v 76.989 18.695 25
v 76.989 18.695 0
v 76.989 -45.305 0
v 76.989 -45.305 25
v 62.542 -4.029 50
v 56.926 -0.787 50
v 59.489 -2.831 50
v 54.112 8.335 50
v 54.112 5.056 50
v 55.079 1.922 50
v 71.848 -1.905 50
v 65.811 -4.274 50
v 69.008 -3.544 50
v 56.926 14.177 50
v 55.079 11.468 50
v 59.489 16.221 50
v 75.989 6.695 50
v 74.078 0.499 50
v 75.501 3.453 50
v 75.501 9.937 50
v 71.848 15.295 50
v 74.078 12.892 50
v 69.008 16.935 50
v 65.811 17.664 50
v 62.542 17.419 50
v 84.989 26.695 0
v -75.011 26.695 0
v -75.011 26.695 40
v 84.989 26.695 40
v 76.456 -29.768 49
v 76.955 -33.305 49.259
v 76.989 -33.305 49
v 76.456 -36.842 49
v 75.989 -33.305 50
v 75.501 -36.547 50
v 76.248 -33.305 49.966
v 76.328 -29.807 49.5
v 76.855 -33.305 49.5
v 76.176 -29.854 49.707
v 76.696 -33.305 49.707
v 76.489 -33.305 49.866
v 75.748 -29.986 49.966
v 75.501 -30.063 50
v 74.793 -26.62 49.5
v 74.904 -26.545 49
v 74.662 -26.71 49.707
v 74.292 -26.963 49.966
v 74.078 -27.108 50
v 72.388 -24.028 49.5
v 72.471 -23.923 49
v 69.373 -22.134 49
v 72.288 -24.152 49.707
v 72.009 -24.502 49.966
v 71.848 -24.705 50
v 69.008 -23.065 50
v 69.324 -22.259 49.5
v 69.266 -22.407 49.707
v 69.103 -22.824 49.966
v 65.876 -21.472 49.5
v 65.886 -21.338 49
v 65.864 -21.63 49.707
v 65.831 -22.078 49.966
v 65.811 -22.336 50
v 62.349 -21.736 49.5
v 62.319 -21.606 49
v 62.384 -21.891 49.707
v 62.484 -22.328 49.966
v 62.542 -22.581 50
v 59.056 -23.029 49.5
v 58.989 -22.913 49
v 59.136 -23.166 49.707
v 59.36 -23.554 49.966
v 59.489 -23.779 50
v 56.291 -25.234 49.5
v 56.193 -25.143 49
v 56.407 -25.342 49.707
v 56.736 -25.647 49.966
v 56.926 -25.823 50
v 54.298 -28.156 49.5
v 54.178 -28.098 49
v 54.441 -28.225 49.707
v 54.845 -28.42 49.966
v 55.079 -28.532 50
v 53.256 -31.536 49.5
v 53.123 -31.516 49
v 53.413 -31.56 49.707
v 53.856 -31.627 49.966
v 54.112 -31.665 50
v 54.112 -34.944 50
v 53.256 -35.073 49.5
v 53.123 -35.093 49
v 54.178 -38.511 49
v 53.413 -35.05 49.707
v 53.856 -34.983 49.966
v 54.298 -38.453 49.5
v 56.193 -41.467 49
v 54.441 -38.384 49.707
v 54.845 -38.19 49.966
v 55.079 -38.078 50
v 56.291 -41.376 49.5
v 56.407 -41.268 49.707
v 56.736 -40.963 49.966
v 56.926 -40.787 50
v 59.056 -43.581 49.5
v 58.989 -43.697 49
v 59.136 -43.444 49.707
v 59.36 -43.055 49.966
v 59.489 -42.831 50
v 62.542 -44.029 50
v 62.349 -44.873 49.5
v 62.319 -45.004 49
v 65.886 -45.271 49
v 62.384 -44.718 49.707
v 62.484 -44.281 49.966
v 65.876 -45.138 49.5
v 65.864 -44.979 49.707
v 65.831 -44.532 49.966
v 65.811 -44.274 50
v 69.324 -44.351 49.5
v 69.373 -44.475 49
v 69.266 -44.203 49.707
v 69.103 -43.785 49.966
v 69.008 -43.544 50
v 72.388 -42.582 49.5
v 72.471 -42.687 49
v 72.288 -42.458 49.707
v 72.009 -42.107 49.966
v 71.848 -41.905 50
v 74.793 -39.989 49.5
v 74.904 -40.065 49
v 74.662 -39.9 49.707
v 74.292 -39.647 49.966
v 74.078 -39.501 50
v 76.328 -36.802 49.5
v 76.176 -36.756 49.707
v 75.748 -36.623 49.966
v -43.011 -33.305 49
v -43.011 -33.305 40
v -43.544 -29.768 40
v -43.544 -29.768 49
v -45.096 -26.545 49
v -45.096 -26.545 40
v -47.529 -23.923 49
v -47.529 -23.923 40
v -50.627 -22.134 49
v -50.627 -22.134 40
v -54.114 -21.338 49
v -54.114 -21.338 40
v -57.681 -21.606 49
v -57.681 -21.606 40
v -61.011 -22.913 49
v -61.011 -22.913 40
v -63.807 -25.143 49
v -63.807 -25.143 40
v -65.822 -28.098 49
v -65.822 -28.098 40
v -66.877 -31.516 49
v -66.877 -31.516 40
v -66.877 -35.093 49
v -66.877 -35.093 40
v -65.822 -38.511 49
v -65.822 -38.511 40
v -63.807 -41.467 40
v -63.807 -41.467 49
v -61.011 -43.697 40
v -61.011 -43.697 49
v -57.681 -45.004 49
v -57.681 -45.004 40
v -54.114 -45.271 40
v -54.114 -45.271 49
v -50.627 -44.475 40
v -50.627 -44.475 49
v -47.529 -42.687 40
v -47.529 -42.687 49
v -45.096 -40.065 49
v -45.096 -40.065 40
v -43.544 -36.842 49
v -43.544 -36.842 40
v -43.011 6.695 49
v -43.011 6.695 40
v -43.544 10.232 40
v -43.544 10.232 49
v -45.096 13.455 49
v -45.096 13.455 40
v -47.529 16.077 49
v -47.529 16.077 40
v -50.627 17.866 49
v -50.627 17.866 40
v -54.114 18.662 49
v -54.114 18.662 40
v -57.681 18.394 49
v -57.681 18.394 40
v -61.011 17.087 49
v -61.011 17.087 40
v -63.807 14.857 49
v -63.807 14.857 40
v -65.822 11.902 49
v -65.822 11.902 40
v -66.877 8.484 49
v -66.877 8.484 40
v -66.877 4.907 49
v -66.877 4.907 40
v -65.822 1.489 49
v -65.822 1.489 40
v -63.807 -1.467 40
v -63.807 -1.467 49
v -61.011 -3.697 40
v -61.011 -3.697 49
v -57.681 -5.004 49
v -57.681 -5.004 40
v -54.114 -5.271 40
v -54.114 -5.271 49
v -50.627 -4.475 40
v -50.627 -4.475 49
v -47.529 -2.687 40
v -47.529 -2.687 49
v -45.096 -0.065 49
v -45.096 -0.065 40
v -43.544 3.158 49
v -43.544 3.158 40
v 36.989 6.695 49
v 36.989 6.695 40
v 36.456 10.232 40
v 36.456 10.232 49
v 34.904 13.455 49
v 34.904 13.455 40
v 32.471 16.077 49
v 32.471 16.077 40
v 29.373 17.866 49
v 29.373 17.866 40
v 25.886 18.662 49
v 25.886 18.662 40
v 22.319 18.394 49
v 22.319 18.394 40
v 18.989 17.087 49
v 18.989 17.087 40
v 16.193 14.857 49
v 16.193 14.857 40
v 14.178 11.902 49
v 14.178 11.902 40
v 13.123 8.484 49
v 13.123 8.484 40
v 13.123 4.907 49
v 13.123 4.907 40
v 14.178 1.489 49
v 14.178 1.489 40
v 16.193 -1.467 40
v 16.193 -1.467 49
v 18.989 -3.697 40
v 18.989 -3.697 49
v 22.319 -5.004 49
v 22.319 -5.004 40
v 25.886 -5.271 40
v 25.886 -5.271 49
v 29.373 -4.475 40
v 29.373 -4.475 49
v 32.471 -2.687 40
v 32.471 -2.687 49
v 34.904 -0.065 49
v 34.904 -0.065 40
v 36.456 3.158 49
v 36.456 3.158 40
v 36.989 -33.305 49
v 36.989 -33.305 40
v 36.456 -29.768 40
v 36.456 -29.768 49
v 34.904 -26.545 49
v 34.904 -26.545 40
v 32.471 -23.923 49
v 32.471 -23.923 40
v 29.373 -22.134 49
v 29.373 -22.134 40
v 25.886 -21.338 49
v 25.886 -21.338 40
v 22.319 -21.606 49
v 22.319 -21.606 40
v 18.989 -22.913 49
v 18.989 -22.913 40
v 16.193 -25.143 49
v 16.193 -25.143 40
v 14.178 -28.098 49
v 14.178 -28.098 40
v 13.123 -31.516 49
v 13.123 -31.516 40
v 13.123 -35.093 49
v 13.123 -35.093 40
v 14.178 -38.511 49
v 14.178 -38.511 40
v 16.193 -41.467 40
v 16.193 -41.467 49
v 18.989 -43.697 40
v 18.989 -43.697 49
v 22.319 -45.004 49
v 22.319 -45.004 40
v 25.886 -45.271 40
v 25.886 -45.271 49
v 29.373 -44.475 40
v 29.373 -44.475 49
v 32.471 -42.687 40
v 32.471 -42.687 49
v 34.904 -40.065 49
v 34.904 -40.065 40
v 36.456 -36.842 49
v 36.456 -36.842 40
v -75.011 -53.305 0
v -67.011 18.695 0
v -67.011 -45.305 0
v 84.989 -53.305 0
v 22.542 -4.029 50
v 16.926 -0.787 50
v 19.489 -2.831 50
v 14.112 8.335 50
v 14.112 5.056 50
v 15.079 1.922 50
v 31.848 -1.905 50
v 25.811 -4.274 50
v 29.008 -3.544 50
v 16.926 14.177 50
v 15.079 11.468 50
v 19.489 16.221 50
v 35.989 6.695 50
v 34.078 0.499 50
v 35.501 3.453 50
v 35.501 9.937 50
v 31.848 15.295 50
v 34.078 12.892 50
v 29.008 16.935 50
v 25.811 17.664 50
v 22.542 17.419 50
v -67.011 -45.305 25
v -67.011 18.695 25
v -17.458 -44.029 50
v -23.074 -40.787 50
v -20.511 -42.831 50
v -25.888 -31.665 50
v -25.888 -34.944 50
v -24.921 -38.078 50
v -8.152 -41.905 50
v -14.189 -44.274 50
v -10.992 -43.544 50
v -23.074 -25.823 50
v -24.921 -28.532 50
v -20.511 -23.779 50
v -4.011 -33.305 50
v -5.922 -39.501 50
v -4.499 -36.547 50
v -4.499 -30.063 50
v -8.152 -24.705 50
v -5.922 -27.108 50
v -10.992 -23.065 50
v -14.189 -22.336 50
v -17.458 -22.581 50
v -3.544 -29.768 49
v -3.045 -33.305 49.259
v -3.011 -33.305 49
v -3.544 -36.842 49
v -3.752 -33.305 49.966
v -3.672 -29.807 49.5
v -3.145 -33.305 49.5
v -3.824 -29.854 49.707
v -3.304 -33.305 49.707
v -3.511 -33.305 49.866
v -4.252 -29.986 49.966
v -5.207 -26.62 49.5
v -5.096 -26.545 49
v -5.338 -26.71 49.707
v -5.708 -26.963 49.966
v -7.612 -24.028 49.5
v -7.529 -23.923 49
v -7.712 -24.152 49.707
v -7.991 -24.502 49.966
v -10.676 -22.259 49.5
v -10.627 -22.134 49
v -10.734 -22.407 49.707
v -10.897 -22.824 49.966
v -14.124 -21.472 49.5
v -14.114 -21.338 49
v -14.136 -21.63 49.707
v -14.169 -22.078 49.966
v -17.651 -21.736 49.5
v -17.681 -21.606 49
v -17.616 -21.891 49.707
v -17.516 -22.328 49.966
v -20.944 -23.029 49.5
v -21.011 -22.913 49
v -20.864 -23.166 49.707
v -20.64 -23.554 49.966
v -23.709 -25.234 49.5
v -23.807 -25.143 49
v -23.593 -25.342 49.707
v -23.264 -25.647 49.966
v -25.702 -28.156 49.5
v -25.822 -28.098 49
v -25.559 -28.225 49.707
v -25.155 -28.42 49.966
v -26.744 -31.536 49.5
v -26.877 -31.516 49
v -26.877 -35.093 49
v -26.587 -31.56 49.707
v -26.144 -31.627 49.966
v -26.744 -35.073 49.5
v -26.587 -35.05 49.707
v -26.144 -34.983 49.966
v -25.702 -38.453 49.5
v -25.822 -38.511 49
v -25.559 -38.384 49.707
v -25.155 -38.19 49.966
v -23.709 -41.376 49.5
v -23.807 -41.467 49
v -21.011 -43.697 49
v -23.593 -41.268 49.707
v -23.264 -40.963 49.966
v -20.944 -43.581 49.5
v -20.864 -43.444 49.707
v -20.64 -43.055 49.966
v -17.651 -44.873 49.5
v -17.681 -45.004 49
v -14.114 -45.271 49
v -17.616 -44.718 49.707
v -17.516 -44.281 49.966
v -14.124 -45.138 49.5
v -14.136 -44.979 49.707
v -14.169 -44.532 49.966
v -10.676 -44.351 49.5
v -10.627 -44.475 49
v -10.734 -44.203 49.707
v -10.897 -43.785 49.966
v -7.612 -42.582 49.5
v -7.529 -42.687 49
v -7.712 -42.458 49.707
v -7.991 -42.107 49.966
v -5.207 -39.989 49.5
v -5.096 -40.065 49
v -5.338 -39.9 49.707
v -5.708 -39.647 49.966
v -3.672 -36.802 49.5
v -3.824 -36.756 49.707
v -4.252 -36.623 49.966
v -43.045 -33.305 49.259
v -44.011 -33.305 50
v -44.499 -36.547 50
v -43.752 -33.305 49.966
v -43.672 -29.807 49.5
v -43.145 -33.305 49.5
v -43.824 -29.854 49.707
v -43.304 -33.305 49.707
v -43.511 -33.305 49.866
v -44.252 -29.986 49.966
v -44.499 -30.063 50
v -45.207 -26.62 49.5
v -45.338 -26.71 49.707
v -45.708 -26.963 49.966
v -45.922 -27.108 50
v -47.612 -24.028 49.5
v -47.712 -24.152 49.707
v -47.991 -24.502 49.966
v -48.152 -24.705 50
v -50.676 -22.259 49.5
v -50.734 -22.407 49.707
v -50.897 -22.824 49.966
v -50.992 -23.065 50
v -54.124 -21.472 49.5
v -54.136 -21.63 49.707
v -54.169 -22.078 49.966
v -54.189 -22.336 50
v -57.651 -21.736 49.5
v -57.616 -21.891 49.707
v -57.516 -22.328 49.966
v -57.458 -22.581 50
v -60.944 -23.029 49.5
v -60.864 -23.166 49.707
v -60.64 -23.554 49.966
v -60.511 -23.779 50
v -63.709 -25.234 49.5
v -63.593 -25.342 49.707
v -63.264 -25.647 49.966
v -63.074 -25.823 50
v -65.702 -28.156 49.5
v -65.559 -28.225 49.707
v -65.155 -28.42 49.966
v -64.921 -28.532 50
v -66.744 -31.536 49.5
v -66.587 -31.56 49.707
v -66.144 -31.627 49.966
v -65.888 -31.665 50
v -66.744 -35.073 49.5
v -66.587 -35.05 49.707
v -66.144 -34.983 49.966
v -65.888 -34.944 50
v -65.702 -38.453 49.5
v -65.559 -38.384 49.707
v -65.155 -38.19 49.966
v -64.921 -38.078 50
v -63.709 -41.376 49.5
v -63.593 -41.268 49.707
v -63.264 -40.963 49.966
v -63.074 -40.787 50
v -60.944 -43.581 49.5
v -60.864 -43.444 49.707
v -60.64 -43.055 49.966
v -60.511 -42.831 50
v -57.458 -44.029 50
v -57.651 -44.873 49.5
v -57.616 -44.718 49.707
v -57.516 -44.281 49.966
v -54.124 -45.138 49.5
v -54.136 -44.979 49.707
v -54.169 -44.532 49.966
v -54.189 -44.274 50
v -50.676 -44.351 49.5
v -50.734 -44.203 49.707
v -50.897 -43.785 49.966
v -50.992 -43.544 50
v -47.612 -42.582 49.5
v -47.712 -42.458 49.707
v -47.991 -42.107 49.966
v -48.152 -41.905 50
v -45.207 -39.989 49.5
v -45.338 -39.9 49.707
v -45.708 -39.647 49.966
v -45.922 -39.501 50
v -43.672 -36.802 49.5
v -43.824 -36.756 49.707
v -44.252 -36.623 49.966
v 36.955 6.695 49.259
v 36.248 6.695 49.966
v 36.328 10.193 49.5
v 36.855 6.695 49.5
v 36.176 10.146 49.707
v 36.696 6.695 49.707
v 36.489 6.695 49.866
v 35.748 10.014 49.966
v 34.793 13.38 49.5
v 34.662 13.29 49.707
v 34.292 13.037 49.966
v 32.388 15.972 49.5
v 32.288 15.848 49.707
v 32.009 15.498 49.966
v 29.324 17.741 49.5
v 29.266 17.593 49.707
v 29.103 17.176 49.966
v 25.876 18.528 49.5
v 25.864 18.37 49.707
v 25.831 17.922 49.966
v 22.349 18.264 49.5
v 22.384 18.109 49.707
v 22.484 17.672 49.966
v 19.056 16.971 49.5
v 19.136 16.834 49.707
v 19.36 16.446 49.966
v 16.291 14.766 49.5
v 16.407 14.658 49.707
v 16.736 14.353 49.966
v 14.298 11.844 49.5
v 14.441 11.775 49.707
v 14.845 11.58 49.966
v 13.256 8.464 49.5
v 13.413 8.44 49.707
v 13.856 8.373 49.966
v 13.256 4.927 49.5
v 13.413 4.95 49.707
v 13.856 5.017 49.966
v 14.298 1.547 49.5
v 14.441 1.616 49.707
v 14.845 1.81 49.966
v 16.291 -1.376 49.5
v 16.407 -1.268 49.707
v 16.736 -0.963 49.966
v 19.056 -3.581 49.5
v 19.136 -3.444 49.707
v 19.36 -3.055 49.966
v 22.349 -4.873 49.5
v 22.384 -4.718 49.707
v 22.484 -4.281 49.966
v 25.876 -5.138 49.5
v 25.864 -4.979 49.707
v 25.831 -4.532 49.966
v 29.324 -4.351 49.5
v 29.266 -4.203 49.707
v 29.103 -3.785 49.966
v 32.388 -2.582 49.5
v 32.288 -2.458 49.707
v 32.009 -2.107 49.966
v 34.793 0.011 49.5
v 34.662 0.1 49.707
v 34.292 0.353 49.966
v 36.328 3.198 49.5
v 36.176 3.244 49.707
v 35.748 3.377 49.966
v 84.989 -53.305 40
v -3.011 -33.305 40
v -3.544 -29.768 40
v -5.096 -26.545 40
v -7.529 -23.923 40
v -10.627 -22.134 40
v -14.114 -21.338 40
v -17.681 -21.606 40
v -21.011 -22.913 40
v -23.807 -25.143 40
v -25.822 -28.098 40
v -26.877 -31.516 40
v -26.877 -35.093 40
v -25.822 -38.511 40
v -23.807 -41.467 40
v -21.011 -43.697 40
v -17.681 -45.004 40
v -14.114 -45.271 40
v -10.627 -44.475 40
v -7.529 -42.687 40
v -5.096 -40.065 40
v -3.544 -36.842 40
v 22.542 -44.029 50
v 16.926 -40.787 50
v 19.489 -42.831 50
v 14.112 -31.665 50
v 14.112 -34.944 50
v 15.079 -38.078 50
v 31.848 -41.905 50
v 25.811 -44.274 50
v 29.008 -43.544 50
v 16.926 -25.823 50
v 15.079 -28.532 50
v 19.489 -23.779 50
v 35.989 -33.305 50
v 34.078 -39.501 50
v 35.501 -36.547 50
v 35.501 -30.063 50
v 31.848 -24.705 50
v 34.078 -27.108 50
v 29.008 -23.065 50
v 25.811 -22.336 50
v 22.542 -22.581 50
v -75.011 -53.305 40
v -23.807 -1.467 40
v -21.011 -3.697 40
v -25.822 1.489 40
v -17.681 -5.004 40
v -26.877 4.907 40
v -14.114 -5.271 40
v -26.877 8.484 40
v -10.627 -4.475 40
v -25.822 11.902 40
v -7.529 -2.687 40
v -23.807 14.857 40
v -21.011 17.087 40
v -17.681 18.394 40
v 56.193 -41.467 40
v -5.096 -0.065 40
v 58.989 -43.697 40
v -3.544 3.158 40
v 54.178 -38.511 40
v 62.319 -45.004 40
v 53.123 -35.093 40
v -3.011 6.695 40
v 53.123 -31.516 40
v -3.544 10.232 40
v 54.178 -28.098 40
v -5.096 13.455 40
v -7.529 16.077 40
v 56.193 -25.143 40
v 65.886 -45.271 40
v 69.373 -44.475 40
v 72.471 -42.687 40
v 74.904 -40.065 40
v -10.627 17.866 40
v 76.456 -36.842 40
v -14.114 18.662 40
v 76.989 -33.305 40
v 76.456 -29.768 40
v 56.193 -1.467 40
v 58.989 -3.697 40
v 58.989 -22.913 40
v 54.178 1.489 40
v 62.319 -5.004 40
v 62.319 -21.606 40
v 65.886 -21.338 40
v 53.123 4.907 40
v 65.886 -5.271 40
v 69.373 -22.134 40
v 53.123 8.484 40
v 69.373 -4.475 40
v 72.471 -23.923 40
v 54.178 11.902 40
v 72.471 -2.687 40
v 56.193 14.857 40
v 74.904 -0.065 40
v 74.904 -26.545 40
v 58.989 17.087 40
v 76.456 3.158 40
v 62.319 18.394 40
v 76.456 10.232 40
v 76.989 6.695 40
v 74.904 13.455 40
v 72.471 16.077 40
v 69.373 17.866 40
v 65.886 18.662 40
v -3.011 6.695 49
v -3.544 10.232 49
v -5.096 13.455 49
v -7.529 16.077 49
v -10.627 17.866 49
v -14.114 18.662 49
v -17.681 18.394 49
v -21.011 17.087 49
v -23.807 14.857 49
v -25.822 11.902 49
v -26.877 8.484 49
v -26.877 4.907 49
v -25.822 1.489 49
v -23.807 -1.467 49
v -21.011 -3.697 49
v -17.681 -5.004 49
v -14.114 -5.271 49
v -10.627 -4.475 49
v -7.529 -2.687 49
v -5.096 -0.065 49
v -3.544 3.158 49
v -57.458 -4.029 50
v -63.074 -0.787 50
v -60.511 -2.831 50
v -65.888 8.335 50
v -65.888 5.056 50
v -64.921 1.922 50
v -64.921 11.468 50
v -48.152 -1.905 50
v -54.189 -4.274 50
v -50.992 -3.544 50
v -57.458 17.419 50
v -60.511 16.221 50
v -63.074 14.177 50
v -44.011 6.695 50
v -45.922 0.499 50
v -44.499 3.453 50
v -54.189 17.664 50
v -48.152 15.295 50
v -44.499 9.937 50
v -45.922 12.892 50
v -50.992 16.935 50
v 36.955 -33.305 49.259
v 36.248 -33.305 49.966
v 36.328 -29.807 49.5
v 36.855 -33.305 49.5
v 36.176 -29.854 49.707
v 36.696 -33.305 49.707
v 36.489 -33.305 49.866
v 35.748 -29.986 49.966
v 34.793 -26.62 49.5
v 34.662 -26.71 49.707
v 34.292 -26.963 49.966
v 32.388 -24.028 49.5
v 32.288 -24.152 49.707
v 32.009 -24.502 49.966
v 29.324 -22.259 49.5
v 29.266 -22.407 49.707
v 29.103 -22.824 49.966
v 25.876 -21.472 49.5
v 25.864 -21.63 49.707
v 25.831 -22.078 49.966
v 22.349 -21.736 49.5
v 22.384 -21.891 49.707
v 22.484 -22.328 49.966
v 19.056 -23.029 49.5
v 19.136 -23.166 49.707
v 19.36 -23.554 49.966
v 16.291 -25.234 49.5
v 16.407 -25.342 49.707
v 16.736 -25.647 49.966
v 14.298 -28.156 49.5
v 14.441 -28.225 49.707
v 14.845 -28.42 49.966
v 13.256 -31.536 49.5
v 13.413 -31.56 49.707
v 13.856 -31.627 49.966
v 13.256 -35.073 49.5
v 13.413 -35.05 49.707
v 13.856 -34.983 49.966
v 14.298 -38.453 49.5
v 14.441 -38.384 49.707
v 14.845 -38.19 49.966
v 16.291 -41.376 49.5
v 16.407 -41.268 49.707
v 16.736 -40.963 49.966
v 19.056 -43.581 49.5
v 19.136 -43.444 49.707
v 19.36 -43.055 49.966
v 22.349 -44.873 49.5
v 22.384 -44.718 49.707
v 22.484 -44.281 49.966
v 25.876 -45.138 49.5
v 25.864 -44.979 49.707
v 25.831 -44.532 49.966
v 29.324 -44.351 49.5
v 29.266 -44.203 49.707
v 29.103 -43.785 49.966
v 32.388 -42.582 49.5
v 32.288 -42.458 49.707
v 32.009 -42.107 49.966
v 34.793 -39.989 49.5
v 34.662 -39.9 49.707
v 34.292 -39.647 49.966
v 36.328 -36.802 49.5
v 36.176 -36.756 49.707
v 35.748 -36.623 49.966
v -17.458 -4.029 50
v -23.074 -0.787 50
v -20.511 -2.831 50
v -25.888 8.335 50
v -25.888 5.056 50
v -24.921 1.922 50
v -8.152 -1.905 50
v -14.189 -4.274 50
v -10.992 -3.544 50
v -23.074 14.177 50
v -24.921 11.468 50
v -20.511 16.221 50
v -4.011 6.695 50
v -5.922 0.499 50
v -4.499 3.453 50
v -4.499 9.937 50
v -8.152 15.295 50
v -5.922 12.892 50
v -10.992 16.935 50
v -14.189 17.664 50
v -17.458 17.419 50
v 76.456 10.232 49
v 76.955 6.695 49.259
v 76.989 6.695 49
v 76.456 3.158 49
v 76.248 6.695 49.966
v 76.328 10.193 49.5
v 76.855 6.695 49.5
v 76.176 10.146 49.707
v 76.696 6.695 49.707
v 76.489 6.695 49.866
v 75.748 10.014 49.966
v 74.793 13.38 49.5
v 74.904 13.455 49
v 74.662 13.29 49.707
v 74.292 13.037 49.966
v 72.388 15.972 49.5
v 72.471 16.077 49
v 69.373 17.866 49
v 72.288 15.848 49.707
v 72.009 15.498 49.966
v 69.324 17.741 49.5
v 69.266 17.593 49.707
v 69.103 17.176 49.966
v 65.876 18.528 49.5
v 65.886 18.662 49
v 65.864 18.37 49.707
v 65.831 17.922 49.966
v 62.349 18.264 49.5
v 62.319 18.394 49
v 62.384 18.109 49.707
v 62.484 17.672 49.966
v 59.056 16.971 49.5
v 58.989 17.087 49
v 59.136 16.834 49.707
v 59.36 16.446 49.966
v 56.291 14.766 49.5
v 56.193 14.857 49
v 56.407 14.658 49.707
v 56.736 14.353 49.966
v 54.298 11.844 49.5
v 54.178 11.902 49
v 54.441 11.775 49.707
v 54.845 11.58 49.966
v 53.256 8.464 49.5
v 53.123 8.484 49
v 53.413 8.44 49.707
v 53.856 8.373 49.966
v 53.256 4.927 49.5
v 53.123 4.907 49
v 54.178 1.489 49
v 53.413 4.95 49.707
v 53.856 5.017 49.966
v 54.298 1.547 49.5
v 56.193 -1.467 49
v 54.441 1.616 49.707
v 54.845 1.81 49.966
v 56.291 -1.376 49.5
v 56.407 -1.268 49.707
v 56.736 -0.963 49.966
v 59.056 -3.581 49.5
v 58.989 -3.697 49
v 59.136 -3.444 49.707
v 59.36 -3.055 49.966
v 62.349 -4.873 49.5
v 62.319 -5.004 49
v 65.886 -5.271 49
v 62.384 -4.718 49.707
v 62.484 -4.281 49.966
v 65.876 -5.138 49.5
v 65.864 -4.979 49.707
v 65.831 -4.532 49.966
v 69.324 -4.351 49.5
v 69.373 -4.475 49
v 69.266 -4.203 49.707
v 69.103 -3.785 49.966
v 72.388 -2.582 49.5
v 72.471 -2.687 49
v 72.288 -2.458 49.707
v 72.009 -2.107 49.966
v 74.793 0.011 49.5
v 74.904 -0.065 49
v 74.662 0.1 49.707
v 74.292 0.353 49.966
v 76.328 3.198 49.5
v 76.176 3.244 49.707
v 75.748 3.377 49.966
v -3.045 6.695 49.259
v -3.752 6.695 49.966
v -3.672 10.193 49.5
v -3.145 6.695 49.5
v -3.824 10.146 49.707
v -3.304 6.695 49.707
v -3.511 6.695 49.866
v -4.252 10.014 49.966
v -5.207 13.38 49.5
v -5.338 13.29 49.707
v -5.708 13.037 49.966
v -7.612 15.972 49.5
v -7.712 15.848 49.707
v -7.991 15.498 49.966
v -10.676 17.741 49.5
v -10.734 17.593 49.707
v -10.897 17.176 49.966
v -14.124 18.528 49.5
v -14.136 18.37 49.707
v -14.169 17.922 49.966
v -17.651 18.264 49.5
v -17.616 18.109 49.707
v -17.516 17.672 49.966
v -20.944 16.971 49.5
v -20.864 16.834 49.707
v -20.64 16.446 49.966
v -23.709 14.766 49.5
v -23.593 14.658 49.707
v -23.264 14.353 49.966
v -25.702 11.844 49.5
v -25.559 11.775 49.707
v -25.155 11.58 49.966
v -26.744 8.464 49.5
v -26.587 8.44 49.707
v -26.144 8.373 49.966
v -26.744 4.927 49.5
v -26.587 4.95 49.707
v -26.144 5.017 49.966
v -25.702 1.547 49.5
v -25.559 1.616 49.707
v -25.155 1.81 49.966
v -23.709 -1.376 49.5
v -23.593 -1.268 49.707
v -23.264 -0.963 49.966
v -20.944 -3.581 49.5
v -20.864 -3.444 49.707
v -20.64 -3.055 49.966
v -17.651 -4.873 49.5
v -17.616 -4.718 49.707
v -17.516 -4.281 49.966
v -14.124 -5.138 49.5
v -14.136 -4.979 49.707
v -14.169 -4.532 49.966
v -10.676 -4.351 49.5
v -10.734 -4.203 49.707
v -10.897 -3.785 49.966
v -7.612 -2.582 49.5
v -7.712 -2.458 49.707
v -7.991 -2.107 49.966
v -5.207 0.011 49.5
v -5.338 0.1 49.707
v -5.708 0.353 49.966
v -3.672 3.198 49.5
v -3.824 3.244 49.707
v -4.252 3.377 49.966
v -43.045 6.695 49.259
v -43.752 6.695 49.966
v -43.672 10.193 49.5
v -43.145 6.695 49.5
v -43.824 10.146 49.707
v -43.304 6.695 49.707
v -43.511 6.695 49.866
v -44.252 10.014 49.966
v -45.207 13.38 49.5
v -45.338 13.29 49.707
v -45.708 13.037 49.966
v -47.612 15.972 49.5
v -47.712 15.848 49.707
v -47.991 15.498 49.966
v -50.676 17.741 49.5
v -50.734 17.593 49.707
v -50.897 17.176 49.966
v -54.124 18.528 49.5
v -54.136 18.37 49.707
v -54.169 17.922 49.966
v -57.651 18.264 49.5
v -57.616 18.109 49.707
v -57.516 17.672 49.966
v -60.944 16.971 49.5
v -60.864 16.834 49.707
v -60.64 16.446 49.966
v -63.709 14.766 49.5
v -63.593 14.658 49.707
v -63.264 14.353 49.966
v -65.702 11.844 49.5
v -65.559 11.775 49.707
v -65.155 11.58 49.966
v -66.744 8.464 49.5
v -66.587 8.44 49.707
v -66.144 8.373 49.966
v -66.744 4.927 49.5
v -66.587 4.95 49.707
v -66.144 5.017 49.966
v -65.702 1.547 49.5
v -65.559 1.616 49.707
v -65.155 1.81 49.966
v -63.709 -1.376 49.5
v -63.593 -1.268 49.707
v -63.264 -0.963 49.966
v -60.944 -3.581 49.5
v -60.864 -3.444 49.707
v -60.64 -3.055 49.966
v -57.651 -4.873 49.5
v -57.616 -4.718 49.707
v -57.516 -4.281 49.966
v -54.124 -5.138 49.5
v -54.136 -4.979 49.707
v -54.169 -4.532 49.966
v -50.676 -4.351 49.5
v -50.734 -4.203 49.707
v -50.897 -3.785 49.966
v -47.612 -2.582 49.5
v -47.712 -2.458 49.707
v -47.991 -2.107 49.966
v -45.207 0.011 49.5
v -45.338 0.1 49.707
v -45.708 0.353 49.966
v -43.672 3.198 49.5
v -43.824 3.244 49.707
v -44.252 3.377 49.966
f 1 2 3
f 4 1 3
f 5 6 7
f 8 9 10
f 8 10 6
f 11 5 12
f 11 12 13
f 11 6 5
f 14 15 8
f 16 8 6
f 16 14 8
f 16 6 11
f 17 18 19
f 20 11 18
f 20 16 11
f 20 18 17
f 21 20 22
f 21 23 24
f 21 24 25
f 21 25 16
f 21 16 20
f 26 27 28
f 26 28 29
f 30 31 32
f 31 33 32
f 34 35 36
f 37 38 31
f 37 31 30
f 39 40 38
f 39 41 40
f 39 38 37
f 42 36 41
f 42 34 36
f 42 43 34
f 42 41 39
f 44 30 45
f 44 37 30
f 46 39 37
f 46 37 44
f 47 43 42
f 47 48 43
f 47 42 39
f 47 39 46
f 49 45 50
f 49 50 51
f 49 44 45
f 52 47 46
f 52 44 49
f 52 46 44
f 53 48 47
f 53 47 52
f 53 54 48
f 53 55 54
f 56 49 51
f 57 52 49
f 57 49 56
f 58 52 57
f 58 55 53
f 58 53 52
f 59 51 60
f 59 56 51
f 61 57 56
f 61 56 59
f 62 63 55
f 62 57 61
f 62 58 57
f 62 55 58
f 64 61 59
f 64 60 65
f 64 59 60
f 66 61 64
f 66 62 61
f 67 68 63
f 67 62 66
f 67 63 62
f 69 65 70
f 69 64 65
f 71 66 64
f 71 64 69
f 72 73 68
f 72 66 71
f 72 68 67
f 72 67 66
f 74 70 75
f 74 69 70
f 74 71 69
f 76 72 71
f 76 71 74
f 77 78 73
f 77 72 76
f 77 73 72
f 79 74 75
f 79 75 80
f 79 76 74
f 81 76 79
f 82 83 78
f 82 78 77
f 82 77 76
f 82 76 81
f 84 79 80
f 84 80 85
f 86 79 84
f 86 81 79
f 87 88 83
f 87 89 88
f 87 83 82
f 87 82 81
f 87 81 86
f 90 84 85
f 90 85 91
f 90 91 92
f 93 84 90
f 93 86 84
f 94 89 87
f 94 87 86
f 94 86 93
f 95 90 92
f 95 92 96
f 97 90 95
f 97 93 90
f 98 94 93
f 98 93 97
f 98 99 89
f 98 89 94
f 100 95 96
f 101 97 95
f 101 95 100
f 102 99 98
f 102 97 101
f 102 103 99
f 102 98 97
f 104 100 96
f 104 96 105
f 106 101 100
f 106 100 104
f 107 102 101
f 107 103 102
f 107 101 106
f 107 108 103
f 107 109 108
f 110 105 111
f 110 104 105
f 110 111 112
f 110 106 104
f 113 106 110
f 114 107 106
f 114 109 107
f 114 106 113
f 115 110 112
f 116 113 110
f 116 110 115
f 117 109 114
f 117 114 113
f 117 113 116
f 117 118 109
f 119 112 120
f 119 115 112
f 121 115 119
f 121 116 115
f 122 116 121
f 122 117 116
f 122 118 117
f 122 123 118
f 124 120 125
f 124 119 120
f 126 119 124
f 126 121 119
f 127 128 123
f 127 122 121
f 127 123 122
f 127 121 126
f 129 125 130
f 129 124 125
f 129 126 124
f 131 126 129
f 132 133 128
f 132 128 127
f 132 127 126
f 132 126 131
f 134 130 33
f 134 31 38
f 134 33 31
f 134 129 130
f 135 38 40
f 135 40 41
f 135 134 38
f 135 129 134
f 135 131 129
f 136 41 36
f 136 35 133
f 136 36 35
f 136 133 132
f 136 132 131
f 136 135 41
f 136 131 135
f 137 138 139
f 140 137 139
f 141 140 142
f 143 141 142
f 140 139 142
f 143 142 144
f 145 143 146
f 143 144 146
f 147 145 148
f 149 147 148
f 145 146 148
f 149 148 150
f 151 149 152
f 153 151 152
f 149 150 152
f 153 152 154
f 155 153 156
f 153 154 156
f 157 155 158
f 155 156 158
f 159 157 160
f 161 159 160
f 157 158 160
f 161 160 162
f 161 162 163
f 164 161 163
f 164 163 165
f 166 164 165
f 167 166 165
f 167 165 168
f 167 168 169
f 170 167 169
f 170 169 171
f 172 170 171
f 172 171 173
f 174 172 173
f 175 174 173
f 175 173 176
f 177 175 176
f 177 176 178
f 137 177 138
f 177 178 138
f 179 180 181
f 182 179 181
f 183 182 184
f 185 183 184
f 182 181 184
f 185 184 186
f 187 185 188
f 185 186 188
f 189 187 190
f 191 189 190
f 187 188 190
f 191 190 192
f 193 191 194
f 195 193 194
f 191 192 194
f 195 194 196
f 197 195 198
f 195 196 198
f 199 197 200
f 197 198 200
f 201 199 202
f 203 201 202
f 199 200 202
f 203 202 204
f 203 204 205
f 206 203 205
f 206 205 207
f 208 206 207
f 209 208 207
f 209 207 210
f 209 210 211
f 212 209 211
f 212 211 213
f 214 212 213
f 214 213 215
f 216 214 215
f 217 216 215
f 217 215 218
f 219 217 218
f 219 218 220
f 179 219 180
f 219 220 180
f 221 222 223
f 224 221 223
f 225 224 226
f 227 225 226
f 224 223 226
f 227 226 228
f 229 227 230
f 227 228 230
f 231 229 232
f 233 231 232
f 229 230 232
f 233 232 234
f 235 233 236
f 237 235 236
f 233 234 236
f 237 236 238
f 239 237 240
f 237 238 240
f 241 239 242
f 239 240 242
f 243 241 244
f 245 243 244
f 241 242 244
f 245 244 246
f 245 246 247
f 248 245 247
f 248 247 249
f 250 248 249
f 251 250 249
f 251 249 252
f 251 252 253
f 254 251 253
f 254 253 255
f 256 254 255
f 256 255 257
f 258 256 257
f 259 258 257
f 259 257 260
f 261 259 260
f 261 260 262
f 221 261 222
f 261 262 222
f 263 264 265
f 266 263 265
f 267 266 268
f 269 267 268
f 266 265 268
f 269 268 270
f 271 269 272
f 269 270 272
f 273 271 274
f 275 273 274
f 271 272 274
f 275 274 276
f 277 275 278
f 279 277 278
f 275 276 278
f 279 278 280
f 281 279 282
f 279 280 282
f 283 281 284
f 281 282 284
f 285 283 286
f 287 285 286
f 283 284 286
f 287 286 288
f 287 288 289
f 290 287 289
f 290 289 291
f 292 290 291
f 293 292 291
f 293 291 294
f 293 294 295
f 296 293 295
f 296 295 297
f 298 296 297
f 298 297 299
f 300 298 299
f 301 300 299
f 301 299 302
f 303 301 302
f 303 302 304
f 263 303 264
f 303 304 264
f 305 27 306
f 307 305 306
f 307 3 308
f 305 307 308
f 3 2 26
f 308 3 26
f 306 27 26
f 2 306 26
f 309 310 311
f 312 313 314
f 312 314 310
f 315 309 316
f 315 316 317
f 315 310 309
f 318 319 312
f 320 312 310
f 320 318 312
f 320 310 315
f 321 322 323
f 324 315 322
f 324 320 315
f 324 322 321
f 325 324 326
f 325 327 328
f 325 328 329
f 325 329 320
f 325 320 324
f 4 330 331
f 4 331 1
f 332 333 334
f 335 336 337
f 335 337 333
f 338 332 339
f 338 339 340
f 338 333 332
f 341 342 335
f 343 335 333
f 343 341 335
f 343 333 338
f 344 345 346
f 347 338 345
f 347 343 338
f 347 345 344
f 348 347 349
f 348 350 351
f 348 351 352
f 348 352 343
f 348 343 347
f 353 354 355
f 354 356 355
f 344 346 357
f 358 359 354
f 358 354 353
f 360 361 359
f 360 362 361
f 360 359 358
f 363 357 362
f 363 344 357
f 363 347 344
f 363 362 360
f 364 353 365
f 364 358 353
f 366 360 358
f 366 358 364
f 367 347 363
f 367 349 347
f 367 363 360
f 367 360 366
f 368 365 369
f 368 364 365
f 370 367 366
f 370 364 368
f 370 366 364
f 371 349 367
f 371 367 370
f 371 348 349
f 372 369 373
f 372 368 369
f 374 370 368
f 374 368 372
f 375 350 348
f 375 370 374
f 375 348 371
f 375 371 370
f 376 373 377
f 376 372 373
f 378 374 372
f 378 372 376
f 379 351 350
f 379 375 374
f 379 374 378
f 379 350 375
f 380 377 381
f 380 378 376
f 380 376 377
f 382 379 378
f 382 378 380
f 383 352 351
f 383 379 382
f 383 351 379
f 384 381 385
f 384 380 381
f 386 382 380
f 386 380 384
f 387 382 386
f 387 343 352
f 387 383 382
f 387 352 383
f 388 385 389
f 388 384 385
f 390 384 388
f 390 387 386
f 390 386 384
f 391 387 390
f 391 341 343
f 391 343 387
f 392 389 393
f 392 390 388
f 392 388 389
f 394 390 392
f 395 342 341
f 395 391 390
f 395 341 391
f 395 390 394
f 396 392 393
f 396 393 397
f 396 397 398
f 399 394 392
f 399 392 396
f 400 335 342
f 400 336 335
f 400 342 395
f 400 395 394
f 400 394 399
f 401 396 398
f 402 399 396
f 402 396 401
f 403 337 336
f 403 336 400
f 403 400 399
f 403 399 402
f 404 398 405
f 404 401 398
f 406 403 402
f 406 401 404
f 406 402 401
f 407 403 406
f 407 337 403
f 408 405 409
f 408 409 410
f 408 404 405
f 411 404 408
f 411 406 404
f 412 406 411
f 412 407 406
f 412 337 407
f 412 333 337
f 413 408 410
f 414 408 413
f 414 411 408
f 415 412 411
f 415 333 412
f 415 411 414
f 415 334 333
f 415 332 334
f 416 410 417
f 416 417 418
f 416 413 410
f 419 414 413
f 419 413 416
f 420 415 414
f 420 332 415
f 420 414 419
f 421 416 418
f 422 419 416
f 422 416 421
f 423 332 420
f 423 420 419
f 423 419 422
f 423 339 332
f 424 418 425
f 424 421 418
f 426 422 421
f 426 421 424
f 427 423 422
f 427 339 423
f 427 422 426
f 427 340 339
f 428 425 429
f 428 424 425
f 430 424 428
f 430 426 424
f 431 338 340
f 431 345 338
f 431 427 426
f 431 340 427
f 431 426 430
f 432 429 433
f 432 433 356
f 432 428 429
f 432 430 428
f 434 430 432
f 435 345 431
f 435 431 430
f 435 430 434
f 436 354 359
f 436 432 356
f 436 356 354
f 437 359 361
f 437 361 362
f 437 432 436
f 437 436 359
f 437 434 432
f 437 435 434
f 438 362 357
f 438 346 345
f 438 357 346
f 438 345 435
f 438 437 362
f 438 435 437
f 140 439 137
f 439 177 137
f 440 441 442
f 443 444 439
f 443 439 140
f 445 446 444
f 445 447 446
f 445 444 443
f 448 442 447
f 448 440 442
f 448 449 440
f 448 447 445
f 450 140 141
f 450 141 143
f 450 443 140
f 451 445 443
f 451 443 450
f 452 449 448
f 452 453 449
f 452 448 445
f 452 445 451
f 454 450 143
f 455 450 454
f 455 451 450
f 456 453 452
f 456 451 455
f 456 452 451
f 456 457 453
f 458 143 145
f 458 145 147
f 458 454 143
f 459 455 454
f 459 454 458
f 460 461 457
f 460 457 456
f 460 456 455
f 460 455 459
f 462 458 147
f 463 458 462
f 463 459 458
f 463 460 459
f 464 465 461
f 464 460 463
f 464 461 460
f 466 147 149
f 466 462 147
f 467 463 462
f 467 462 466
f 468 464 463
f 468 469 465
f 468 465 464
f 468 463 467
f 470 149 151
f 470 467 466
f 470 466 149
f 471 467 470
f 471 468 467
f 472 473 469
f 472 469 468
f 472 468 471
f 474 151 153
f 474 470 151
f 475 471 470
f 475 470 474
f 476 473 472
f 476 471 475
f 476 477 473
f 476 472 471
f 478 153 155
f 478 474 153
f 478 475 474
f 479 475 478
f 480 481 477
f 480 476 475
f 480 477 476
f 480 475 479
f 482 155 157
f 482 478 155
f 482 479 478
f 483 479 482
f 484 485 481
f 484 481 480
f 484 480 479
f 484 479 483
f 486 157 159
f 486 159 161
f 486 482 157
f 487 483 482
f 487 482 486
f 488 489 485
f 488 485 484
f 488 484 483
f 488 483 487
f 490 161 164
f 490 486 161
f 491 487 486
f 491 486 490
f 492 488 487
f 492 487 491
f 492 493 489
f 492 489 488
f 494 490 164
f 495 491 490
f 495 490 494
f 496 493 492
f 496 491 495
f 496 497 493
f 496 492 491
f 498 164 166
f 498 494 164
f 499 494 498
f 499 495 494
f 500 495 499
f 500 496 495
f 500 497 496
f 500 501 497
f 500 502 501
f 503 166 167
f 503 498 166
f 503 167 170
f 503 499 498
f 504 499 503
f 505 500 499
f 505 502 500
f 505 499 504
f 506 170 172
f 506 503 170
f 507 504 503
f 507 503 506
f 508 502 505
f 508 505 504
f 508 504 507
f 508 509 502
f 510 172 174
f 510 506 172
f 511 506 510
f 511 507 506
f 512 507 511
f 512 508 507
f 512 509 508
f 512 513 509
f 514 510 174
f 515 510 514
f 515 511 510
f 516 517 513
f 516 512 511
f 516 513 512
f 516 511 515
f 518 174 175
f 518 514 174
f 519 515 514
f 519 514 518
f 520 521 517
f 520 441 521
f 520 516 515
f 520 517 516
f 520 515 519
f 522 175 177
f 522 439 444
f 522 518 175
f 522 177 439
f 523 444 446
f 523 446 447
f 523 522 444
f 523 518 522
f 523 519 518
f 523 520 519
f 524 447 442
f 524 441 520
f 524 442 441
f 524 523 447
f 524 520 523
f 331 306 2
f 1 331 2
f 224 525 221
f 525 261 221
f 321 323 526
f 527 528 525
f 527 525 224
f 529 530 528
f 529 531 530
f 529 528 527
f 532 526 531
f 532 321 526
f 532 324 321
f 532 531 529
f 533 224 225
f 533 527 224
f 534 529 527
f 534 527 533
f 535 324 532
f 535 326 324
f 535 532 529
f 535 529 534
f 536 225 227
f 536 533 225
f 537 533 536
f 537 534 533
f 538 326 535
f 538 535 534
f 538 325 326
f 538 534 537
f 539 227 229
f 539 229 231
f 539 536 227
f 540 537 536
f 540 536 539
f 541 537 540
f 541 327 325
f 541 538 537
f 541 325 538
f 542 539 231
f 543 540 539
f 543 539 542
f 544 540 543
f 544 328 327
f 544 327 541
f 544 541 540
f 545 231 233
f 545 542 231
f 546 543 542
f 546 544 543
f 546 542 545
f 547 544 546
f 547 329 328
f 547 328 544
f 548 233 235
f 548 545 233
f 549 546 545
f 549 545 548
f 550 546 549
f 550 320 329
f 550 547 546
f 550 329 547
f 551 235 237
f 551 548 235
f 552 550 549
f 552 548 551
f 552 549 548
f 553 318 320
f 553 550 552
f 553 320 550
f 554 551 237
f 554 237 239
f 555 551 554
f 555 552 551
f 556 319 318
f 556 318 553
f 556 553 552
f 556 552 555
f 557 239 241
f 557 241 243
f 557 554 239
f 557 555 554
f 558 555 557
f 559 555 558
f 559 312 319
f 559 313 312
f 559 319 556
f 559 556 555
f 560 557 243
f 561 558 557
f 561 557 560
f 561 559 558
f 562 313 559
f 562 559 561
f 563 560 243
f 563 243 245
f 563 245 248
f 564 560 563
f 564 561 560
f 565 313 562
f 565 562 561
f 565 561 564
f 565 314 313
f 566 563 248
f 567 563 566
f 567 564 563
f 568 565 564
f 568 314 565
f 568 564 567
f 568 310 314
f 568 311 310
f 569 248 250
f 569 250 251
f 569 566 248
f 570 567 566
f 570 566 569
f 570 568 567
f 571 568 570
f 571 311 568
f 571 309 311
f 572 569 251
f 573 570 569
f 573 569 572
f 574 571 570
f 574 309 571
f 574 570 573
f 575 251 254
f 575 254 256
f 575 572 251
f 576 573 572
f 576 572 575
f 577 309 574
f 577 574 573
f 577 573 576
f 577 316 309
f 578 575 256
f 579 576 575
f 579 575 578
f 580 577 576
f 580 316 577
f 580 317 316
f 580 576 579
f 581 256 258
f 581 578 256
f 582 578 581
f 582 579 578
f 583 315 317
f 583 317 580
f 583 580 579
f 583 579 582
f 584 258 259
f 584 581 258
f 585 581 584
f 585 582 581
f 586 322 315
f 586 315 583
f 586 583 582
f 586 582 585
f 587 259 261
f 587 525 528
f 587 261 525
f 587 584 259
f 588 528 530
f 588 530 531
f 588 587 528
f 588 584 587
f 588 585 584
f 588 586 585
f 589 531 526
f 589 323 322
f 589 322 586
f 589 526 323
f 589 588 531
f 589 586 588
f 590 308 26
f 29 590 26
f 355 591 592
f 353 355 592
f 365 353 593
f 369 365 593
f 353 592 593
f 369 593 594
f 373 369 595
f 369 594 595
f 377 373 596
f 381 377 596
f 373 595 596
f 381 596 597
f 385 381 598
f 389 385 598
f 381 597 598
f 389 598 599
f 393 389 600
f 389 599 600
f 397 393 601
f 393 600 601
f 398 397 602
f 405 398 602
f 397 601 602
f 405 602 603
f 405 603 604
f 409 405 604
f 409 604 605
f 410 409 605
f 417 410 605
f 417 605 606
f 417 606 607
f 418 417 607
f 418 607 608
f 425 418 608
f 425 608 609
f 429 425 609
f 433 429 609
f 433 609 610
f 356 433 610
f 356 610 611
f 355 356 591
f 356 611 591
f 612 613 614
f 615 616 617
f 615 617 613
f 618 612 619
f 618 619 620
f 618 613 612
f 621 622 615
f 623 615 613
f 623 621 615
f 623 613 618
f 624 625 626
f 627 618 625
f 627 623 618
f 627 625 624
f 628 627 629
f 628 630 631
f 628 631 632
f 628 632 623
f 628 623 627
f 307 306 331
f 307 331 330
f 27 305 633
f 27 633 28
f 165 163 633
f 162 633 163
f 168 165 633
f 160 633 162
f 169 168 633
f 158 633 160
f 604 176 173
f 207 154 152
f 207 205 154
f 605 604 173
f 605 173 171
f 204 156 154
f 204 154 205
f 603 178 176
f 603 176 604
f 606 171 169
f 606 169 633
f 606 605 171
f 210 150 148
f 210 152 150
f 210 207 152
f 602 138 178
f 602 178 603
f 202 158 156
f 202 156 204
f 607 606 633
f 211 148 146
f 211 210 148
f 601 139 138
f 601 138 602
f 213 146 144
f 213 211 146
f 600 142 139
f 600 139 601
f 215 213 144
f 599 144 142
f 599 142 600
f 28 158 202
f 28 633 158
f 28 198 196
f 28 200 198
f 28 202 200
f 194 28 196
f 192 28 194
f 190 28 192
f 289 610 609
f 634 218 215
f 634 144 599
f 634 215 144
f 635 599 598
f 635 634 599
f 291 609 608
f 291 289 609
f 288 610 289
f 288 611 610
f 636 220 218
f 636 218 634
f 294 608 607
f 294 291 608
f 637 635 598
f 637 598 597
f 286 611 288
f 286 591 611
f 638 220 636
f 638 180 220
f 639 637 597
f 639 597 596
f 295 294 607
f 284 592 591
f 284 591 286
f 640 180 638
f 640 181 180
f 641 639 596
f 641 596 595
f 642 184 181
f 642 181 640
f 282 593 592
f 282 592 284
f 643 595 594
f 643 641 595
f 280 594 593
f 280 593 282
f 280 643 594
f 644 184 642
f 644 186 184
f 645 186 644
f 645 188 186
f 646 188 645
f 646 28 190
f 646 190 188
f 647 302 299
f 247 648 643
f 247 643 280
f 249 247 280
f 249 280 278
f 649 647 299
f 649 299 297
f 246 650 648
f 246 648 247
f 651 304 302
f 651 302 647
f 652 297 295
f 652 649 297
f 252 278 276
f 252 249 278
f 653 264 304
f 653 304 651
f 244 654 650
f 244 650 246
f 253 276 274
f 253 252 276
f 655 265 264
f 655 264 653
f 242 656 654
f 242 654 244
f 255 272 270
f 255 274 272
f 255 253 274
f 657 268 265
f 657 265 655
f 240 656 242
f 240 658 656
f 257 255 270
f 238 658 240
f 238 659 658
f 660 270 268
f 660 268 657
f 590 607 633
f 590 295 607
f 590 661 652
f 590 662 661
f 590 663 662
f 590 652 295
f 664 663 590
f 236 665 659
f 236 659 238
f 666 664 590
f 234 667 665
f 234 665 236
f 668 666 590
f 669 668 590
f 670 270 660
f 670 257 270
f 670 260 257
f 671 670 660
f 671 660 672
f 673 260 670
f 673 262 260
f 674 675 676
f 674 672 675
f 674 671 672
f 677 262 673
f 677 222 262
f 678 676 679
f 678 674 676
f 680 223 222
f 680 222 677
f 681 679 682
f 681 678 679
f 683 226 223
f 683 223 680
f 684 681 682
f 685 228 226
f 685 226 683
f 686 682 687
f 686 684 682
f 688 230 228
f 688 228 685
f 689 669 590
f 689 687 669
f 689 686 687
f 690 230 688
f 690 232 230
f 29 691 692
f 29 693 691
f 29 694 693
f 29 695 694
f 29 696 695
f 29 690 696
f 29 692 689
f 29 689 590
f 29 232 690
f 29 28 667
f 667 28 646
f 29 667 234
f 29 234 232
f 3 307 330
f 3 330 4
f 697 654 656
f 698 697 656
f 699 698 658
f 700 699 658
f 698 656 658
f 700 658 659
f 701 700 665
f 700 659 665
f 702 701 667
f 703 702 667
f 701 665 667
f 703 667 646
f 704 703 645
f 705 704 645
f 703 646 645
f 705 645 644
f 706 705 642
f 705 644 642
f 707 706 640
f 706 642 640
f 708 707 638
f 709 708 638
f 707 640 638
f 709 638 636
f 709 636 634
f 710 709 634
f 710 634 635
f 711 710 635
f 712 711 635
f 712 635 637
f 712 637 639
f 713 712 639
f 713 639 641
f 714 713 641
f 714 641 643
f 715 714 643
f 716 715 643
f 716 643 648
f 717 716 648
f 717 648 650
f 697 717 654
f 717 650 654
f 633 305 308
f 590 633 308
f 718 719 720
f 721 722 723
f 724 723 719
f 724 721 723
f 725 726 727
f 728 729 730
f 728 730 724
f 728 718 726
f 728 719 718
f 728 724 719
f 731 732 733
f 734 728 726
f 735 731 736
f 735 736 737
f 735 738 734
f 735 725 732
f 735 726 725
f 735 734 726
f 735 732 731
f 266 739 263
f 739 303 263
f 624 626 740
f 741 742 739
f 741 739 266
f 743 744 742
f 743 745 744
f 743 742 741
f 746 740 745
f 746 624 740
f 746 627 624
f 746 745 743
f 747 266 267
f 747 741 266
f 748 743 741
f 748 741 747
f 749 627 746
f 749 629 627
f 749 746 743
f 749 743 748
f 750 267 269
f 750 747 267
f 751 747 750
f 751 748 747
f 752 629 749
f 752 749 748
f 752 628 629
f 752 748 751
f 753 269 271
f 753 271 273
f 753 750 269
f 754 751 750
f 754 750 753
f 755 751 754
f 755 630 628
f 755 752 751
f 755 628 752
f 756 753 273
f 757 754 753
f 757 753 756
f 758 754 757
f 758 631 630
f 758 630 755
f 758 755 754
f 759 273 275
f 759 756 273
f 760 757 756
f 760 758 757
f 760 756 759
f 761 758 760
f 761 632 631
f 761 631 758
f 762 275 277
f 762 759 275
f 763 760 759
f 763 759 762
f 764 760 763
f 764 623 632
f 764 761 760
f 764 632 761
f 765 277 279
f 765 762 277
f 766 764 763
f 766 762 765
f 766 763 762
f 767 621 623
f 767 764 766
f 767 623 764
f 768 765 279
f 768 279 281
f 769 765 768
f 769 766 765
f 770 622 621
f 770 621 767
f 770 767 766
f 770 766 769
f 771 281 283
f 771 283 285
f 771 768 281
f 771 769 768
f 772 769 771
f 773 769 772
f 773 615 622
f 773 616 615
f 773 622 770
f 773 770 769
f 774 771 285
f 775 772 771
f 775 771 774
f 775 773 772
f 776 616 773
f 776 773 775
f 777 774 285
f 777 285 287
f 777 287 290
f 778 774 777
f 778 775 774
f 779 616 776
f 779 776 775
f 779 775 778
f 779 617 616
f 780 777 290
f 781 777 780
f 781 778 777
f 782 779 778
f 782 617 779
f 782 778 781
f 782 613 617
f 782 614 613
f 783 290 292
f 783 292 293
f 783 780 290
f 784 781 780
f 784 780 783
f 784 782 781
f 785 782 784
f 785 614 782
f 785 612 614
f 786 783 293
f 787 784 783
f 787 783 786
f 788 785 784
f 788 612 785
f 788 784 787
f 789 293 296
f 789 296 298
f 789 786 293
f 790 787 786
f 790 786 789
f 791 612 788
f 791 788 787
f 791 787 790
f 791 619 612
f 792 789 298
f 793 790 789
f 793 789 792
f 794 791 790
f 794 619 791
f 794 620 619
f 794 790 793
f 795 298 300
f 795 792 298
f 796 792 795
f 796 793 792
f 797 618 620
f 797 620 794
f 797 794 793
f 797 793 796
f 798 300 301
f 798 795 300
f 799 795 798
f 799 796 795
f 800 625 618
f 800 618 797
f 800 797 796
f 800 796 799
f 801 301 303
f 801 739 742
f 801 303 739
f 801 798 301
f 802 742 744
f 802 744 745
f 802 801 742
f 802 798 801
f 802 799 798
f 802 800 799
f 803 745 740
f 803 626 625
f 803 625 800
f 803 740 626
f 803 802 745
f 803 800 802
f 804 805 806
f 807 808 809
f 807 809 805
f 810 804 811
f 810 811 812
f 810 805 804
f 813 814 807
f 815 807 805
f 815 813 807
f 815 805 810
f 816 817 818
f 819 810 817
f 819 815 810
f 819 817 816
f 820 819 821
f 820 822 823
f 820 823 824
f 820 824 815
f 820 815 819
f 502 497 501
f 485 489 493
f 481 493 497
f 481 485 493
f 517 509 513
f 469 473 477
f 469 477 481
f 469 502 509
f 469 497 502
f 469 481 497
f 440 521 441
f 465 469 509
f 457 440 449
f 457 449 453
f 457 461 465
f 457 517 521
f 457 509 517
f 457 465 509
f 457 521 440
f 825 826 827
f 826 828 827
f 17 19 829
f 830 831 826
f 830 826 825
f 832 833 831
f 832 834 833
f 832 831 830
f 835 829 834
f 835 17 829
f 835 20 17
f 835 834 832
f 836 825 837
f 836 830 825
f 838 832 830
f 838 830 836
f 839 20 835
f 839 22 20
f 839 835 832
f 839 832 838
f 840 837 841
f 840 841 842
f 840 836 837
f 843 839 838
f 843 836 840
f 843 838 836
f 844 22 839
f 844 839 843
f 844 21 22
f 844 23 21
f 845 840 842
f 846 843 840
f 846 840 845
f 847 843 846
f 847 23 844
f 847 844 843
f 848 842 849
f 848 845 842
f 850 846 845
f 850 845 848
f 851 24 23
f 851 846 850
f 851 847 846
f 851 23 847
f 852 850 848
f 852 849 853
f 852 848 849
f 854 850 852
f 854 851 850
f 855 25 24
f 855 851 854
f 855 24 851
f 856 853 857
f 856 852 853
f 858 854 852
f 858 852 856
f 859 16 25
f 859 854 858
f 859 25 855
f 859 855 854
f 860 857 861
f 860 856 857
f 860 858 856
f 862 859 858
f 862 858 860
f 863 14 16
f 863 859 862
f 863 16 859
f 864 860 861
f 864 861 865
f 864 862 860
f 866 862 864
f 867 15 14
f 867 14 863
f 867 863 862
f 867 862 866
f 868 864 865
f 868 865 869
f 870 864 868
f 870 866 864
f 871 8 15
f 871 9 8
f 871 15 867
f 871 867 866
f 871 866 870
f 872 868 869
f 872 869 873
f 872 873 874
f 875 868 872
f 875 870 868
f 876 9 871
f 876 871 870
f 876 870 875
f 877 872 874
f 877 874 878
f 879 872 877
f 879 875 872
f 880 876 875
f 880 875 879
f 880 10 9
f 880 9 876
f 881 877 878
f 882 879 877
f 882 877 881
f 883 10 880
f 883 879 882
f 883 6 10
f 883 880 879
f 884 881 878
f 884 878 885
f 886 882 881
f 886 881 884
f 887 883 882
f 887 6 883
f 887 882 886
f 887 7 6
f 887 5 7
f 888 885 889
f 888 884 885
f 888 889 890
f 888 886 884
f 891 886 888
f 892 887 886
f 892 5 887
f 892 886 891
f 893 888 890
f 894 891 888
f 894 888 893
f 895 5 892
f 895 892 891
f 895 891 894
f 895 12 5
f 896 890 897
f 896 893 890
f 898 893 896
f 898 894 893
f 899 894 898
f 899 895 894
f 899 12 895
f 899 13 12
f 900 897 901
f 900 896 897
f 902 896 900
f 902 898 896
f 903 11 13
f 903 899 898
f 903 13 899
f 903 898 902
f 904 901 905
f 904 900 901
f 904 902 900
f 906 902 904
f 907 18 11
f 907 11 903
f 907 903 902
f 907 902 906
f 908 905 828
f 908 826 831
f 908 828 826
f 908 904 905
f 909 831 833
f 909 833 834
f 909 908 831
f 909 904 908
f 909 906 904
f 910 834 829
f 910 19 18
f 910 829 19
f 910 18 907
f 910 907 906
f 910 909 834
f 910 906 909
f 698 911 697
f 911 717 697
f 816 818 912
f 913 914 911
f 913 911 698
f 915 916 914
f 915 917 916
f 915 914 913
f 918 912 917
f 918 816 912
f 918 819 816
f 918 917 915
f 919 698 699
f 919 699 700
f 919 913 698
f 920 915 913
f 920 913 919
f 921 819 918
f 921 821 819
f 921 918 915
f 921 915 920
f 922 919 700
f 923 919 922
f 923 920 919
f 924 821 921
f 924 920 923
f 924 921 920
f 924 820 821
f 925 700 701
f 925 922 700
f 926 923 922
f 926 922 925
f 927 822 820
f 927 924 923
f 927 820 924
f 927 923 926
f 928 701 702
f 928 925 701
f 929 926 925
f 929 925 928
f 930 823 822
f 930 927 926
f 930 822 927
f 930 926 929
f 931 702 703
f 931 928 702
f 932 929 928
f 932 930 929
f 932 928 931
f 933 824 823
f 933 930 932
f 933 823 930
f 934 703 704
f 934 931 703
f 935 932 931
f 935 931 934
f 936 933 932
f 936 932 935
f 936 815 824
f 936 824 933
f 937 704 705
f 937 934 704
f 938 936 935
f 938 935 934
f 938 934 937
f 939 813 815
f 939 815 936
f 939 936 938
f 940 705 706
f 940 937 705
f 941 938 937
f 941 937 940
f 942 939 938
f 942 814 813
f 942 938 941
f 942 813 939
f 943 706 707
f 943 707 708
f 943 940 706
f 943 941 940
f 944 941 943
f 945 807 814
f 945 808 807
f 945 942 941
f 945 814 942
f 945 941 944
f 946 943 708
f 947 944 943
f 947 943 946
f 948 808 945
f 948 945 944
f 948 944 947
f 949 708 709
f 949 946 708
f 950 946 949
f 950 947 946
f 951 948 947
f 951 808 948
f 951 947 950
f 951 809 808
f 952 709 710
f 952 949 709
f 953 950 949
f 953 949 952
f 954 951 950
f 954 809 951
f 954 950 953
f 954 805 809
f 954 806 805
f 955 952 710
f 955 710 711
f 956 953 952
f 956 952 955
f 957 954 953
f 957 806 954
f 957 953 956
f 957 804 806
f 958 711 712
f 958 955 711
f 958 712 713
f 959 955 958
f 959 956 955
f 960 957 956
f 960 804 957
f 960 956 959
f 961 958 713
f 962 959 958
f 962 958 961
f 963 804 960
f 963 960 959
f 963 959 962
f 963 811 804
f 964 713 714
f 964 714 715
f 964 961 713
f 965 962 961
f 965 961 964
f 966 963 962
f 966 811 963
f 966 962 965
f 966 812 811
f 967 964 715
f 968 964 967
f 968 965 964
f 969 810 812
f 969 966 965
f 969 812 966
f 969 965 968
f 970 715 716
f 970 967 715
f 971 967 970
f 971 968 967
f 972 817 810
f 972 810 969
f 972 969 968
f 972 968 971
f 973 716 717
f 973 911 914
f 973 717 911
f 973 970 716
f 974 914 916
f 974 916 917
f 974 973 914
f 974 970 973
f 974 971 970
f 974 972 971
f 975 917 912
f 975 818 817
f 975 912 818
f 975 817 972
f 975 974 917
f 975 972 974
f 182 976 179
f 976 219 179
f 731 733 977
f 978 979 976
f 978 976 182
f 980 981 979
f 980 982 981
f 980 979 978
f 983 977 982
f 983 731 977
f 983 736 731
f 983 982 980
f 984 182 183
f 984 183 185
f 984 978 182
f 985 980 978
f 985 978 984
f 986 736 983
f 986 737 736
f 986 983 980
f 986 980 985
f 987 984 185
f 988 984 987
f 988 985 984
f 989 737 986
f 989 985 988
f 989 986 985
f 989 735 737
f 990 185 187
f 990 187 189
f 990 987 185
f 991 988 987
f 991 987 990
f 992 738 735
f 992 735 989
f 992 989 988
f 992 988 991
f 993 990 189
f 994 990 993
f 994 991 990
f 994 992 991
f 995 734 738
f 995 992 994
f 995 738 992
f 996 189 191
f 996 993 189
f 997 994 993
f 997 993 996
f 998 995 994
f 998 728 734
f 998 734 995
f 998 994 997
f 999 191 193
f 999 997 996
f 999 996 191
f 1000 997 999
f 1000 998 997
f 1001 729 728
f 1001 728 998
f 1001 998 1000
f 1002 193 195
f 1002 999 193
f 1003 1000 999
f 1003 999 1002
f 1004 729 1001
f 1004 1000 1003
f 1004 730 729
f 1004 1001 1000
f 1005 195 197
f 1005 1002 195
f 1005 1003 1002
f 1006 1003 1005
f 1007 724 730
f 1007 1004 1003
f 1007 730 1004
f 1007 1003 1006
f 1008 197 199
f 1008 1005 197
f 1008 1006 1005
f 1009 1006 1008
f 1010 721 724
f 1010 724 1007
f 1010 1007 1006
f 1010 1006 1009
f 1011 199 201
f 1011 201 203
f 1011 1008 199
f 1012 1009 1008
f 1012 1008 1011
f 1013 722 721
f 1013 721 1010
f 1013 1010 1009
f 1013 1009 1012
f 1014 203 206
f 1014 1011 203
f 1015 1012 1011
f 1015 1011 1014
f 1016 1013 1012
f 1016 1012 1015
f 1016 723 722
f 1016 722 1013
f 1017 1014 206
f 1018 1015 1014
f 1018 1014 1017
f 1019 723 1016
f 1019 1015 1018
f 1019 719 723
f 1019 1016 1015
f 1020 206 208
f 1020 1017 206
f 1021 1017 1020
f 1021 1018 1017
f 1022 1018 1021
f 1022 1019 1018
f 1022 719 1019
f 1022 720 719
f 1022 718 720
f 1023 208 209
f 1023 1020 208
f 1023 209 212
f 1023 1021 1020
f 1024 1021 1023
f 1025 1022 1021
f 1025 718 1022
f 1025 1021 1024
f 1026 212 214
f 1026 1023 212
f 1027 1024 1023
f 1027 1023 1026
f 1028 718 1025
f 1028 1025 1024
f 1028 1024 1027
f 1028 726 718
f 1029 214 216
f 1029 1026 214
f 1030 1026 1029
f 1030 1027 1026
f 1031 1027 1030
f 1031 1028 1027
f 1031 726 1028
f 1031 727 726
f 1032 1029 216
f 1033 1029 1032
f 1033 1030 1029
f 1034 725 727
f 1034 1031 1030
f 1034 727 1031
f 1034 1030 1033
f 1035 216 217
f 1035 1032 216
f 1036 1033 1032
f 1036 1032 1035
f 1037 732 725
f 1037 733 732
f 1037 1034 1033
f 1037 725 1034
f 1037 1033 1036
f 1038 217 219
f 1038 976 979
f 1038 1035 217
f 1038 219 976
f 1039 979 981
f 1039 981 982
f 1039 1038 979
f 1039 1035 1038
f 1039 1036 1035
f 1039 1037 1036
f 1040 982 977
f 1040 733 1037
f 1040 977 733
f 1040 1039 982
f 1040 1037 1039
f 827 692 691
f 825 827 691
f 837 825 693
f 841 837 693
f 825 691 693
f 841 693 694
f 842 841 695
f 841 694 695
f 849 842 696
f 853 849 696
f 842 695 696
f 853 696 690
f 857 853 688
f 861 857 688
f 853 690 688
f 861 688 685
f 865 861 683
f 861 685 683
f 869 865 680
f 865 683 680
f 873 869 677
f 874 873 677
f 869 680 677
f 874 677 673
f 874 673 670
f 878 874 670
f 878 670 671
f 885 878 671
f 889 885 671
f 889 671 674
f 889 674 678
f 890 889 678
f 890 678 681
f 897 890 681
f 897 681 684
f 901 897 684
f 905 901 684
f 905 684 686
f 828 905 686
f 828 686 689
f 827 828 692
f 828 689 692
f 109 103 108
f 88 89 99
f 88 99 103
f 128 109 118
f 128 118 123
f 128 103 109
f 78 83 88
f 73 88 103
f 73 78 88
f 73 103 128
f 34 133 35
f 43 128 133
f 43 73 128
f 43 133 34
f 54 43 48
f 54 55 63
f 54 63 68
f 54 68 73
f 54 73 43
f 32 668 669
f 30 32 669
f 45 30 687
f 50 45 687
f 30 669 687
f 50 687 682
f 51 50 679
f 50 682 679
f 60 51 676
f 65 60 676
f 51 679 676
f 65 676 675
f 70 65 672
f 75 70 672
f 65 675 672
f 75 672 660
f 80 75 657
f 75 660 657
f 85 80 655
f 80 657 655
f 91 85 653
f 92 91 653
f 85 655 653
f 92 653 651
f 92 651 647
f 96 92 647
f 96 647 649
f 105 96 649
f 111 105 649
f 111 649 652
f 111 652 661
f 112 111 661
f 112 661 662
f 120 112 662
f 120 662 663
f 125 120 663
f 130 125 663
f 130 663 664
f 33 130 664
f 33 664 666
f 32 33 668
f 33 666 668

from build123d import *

# Parameters (mm, degrees)
F0_W     = 160
F0_H     = 80
F1_DEPTH = 40
F2_W     = 144
F2_H     = 64
F3_DEPTH = 25
F4_R     = 12
F5_DEPTH = 10
F6_R     = 1


with BuildPart() as f1:
    # F0 (on Top) → F1 (new body)
    with BuildSketch(Plane.XY):
        with Locations((4.989235, -13.304857)):
            Rectangle(F0_W, F0_H)
    extrude(amount=F1_DEPTH)

    # F2 (on face) → F3 (cut)
    with BuildSketch(Plane(origin=(0, 0, 0), x_dir=(1, 0, 0), z_dir=(0, 0, -1))):
        with Locations((4.989235, 13.304857)):
            Rectangle(F2_W, F2_H)
    extrude(amount=-F3_DEPTH, mode=Mode.SUBTRACT)

    # F4 (on face) → F5 (join)
    with BuildSketch(Plane.XY.offset(40)):
        with Locations((-55.010765, 6.695143)):
            Circle(F4_R)
        with Locations((-55.010765, -33.304857)):
            Circle(F4_R)
        with Locations((-15.010765, 6.695143)):
            Circle(F4_R)
        with Locations((-15.010765, -33.304857)):
            Circle(F4_R)
        with Locations((24.989235, 6.695143)):
            Circle(F4_R)
        with Locations((24.989235, -33.304857)):
            Circle(F4_R)
        with Locations((64.989235, 6.695143)):
            Circle(F4_R)
        with Locations((64.989235, -33.304857)):
            Circle(F4_R)
    extrude(amount=F5_DEPTH)

    # F6
    f6_edges = [f1.edges().sort_by_distance(p)[0] for p in [
        (-67.010765, 6.695143, 50),
        (-27.010765, 6.695143, 50),
        (12.989235, 6.695143, 50),
        (52.989235, 6.695143, 50),
        (-67.010765, -33.304857, 50),
        (-27.010765, -33.304857, 50),
        (12.989235, -33.304857, 50),
        (52.989235, -33.304857, 50),
    ]]
    fillet(f6_edges, radius=F6_R)


solid = f1.part
